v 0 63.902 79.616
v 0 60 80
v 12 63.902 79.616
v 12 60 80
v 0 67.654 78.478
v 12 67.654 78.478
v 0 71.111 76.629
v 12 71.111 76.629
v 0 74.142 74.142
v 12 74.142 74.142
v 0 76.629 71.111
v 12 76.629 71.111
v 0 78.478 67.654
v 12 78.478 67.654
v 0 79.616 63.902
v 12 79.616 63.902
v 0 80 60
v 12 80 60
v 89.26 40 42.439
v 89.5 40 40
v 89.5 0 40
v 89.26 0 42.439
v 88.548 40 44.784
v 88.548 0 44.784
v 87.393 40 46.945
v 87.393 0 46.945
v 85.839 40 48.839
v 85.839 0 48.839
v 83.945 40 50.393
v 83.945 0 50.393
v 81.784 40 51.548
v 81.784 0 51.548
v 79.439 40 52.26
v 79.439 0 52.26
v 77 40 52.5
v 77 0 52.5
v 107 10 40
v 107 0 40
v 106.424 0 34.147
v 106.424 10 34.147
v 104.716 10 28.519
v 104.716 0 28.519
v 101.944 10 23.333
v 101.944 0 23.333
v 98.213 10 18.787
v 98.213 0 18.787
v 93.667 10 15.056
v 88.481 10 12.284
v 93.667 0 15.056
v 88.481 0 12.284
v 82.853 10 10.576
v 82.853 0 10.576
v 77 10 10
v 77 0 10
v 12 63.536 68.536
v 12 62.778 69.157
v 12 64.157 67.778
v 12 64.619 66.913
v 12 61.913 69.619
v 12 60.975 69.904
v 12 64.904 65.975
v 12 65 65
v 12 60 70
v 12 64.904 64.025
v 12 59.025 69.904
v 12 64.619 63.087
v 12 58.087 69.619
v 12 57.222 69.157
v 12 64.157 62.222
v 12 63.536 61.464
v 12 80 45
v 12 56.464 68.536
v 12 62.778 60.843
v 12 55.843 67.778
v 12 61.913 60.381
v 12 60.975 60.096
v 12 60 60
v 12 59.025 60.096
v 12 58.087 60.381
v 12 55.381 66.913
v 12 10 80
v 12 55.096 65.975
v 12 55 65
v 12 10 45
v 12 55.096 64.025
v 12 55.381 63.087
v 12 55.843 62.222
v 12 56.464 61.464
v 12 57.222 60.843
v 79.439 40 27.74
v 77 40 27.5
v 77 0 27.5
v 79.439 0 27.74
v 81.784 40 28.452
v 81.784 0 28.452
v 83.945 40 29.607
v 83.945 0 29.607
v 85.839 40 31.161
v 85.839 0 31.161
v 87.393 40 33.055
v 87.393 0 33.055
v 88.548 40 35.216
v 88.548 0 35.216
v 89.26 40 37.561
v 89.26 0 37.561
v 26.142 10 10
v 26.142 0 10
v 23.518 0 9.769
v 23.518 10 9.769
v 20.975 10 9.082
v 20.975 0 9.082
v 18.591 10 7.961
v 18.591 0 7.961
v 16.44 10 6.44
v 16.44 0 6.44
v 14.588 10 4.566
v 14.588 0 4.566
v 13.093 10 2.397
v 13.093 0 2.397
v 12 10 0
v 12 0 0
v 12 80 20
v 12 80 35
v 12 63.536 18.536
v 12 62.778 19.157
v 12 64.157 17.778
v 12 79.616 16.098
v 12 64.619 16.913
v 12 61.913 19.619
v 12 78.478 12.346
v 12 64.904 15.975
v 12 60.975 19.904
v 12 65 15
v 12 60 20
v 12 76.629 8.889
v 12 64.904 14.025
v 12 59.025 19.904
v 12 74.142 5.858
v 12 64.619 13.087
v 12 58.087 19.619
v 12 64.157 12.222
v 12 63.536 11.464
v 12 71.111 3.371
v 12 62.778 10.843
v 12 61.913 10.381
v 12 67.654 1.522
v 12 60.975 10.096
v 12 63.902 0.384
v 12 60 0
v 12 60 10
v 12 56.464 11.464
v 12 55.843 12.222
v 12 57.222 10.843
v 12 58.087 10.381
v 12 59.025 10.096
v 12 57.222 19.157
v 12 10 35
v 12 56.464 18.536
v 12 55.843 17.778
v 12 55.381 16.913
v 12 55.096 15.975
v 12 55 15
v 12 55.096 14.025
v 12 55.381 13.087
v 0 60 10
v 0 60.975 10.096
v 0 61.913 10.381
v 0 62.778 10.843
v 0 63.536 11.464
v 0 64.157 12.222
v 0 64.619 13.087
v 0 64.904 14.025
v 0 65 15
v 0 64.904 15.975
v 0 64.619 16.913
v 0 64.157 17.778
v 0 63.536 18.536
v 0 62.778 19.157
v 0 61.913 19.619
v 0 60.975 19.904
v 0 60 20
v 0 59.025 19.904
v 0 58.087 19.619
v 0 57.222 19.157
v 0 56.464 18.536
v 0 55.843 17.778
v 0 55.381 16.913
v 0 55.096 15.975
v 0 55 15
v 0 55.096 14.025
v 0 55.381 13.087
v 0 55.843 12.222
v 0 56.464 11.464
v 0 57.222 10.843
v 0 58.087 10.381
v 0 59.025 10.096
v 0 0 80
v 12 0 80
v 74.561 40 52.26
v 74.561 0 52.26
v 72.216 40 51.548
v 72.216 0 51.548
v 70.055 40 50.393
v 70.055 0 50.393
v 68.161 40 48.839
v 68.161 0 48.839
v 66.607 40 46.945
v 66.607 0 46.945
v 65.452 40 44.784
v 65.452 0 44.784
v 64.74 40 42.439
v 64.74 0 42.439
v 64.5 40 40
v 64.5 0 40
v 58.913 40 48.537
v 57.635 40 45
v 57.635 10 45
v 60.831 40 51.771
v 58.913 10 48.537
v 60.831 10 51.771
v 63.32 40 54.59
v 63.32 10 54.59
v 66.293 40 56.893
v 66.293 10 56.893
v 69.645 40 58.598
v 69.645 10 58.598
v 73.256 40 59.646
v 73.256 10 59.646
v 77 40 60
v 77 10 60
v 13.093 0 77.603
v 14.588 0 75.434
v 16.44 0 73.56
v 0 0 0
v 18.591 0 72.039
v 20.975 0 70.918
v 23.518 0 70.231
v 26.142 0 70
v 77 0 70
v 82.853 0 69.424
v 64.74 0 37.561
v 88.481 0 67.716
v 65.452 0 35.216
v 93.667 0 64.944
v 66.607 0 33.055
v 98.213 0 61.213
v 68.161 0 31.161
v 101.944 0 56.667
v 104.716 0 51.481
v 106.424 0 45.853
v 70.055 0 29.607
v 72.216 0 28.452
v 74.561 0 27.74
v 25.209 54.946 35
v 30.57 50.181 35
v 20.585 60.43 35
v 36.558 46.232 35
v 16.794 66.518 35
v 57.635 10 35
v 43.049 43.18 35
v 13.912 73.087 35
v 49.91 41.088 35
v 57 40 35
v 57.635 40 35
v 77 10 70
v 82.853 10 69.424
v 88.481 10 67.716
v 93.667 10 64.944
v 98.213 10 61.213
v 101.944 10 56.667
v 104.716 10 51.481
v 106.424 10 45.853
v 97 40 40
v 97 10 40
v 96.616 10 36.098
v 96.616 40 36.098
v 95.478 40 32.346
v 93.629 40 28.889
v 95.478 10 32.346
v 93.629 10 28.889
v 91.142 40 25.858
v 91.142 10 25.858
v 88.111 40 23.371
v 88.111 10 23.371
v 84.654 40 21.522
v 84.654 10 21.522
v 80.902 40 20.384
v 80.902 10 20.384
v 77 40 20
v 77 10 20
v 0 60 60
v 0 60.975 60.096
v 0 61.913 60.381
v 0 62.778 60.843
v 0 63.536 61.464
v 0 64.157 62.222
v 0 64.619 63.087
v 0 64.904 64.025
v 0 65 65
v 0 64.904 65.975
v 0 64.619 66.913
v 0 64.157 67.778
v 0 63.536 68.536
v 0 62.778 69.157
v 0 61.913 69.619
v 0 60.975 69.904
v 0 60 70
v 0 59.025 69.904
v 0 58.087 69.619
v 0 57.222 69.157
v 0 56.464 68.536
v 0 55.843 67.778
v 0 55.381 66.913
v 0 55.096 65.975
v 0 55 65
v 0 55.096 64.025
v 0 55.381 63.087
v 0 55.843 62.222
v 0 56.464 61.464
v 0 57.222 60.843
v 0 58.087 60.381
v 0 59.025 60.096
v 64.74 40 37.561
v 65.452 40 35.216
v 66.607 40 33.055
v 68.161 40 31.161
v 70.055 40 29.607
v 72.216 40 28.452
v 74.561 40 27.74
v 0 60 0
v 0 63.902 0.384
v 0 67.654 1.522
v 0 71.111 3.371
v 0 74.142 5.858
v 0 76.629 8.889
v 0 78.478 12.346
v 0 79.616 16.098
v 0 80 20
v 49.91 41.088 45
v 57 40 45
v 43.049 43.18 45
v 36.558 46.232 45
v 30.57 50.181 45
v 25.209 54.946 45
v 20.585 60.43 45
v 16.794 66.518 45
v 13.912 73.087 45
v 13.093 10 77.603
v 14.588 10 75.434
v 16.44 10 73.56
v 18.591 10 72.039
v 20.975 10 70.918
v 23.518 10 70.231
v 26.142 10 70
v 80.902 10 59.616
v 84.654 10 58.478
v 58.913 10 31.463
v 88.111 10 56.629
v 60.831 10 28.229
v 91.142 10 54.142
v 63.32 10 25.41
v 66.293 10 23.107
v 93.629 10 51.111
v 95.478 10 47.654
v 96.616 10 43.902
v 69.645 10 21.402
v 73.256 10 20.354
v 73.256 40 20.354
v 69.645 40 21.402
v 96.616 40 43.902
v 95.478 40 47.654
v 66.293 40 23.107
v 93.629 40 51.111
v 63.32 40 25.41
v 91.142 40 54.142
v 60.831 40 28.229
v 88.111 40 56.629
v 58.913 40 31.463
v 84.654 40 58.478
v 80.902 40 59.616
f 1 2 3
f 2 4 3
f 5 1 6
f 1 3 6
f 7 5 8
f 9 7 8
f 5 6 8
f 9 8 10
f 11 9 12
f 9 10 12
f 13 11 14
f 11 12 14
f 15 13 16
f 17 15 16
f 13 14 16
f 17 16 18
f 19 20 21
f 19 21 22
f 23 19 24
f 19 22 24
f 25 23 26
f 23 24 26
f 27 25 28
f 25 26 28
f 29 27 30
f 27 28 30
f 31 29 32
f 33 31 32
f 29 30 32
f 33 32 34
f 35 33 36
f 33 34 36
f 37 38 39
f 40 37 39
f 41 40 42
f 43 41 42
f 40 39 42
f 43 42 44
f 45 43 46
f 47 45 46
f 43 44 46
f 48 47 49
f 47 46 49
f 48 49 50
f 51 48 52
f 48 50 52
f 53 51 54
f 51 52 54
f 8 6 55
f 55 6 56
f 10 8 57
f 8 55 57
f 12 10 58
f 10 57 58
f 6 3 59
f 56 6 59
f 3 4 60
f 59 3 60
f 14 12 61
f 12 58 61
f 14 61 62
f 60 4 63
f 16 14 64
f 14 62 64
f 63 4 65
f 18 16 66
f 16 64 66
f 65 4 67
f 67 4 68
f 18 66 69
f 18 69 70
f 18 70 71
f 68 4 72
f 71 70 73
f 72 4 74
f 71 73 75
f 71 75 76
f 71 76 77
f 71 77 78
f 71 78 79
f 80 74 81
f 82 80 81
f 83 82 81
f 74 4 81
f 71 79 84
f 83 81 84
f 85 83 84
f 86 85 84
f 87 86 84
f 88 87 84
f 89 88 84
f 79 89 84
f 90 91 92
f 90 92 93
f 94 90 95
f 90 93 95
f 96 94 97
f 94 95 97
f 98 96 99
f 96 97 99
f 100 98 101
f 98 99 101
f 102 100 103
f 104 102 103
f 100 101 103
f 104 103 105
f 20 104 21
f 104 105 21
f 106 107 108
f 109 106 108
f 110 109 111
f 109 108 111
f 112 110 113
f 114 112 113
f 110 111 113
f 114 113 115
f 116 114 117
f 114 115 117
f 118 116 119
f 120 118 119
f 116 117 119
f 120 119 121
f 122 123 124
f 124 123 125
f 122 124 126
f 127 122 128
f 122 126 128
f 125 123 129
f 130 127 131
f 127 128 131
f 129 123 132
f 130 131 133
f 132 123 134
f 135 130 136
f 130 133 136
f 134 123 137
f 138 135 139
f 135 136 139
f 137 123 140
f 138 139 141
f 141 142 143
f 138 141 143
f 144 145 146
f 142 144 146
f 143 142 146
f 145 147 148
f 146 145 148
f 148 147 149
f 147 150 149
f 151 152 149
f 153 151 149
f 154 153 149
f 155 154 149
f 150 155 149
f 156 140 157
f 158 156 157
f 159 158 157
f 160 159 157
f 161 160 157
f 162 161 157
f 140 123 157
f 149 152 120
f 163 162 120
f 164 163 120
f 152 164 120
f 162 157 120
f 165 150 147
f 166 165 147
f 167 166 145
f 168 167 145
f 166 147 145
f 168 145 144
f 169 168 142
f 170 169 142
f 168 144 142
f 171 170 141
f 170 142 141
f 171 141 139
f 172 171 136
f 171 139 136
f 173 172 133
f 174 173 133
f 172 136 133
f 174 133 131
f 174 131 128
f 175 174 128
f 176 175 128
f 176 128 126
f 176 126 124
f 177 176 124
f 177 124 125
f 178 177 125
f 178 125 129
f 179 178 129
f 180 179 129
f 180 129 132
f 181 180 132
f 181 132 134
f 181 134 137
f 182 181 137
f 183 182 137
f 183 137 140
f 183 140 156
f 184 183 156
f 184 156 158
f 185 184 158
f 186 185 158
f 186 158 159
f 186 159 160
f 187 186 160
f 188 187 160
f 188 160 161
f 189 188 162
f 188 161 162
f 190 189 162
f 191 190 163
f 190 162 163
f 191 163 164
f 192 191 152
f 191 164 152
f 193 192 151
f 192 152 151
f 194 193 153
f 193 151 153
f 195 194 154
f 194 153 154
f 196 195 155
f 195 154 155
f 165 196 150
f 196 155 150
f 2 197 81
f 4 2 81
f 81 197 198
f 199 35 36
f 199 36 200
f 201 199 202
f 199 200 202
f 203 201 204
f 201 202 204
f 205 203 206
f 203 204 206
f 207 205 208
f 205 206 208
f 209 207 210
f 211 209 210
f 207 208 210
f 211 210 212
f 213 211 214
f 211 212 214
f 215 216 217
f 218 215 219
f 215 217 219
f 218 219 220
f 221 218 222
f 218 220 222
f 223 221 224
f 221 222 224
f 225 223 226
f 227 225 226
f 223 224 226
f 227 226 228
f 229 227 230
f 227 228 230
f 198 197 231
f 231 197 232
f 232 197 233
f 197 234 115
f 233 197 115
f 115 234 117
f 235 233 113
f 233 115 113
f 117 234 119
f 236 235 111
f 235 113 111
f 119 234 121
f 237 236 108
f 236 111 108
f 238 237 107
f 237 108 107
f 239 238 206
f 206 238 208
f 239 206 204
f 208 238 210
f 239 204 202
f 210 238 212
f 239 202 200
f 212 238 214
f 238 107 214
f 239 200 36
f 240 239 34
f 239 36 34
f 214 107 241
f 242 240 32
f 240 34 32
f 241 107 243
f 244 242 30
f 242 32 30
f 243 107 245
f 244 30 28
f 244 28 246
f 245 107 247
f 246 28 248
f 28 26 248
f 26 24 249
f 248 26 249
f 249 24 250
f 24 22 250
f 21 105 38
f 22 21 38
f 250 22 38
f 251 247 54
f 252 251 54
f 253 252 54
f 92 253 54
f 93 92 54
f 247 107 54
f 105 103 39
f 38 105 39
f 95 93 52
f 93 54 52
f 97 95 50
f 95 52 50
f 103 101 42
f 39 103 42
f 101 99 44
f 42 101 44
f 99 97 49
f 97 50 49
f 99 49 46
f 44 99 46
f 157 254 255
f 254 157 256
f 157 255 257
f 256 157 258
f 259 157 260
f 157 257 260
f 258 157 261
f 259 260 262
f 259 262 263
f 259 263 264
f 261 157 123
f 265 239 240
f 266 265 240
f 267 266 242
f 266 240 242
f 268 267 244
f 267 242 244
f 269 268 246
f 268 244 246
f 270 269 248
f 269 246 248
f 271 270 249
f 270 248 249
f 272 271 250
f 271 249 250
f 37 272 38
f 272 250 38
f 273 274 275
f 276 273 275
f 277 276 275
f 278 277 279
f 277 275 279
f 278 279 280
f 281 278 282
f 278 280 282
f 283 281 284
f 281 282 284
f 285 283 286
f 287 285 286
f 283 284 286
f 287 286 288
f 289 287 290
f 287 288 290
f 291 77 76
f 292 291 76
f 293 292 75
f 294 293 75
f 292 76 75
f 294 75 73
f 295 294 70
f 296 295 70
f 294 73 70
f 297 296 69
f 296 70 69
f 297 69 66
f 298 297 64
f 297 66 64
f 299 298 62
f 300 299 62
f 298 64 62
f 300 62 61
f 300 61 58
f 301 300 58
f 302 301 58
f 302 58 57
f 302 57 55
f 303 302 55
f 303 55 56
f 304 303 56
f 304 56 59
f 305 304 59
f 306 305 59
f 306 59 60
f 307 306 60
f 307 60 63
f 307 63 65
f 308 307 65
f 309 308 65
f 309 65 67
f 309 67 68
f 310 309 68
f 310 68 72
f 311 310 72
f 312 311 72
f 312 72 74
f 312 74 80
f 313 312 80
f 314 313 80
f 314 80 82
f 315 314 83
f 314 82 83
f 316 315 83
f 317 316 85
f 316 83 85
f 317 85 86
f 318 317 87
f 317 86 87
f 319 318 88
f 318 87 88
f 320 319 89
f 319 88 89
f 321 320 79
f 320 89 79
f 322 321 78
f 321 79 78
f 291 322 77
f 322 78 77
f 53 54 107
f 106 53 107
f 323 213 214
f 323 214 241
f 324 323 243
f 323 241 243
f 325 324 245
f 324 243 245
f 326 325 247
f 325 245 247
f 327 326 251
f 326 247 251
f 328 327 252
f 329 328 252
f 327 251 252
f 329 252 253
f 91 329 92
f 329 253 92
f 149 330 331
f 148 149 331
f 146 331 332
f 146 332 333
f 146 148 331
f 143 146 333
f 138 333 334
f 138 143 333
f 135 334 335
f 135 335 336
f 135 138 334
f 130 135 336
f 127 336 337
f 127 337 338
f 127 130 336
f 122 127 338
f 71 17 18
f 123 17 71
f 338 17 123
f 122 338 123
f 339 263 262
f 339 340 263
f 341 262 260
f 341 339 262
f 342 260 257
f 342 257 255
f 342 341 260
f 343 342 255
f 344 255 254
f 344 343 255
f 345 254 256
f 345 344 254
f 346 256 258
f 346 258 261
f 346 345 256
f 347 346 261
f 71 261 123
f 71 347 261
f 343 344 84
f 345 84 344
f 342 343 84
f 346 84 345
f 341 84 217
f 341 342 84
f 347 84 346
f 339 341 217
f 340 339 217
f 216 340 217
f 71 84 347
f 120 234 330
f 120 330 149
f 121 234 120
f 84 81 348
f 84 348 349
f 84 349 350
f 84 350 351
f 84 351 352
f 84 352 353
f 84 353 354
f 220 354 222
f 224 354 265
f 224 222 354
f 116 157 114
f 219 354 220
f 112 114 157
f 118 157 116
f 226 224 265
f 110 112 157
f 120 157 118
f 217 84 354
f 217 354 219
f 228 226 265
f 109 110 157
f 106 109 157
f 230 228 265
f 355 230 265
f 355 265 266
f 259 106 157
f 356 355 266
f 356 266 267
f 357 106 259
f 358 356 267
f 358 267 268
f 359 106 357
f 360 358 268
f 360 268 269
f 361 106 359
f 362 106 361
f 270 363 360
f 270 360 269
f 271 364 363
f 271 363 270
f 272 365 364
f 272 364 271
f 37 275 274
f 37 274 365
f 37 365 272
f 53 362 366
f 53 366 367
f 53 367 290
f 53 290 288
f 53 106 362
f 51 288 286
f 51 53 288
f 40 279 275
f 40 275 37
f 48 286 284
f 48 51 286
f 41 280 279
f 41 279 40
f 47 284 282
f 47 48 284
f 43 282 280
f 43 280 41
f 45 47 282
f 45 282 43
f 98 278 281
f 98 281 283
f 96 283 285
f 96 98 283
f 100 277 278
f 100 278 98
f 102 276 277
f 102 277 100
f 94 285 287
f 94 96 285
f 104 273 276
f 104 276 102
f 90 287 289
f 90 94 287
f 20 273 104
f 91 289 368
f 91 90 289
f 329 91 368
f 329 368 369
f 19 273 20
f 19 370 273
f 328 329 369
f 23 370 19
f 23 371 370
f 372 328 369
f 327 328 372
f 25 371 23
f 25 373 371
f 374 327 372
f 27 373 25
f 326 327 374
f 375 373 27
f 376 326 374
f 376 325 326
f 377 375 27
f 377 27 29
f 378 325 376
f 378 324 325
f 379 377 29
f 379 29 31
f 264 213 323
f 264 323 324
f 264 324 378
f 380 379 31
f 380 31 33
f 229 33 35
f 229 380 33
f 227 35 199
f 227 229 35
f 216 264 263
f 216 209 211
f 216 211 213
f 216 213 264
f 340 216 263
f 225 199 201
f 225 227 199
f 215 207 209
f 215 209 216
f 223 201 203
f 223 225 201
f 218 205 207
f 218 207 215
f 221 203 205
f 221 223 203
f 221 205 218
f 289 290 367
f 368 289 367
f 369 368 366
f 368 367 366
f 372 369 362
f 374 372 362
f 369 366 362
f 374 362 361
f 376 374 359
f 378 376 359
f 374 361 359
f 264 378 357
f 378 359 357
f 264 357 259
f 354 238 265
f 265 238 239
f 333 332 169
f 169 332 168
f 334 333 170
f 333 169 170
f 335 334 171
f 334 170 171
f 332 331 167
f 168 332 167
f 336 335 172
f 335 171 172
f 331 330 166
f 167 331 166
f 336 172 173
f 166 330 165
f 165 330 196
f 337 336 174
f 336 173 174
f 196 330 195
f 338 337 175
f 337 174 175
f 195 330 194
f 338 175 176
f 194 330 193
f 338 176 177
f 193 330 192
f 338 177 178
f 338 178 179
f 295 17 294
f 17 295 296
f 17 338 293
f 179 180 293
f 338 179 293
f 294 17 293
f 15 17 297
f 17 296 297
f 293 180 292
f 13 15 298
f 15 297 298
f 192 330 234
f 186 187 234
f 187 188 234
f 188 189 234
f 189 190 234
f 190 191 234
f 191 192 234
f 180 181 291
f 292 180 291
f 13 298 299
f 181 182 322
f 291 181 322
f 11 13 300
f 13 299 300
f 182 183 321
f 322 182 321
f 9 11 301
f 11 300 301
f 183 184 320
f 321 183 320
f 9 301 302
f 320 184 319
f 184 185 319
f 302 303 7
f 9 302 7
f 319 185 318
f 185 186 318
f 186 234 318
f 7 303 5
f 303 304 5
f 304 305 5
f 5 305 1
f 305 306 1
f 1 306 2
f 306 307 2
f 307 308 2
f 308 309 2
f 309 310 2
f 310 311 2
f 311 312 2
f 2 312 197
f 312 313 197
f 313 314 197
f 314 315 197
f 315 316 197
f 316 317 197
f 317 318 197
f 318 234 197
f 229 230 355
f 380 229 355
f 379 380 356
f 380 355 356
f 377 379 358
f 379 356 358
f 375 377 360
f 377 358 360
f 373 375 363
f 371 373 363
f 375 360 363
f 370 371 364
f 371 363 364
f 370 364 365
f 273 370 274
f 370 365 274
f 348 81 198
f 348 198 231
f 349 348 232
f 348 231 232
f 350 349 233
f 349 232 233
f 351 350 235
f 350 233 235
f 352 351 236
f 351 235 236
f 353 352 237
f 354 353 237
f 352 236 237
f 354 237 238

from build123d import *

# Parameters (mm, degrees)
SKETCH1_R            = 20
BOSS_EXTRUDE3_DEPTH  = 10
SKETCH1_6_W          = 12
SKETCH1_6_H          = 80
BOSS_EXTRUDE4_DEPTH  = 80
FILLET1_R            = 20
SKETCH1_8_R          = 20
SKETCH1_8_R_2        = 12.5
BOSS_EXTRUDE5_DEPTH  = 40
BOSS_EXTRUDE11_DEPTH = 5
SKETCH12_R           = 5
CUT_EXTRUDE1_DEPTH   = 148.732867027


with BuildPart() as part:
    # Sketch1 → Boss-Extrude3 (new body)
    with BuildSketch(Plane(origin=(0, 0, 0), x_dir=(1, 0, 0), z_dir=(0, 1, 0))):
        with BuildLine():
            ThreePointArc((26.142135624, -10), (17.481881586, -7.247448714), (12, 0))
            Line((12, 0), (12, -80))
            ThreePointArc((12, -80), (17.481881586, -72.752551286), (26.142135624, -70))
            Line((26.142135624, -70), (77, -70))
            ThreePointArc((77, -70), (107, -40), (77, -10))
            Line((77, -10), (26.142135624, -10))
        make_face()
        with Locations((77, -40)):
            Circle(SKETCH1_R, mode=Mode.SUBTRACT)
    extrude(amount=BOSS_EXTRUDE3_DEPTH)

    # Sketch1<6> → Boss-Extrude4 (add)
    with BuildSketch(Plane(origin=(0, 0, 0), x_dir=(1, 0, 0), z_dir=(0, 1, 0))):
        with Locations((6, -40)):
            Rectangle(SKETCH1_6_W, SKETCH1_6_H)
    extrude(amount=BOSS_EXTRUDE4_DEPTH)

    # Fillet1
    fillet1_edges = [part.edges().sort_by_distance(p)[0] for p in [
        (6, 80, 0),
        (6, 80, 80),
    ]]
    fillet(fillet1_edges, radius=FILLET1_R)

    # Sketch1<8> → Boss-Extrude5 (add)
    with BuildSketch(Plane(origin=(0, 0, 0), x_dir=(1, 0, 0), z_dir=(0, 1, 0))):
        with Locations((77, -40)):
            Circle(SKETCH1_8_R)
        with Locations((77, -40)):
            Circle(SKETCH1_8_R_2, mode=Mode.SUBTRACT)
    extrude(amount=BOSS_EXTRUDE5_DEPTH)

    # Sketch11 → Boss-Extrude11 (add, symmetric)
    with BuildSketch(Plane.XY.offset(40)):
        with BuildLine():
            Line((12, 80), (12, 10))
            Line((12, 10), (57, 10))
            Line((57, 10), (64.5, 10))
            Line((64.5, 10), (64.5, 40))
            Line((64.5, 40), (57, 40))
            ThreePointArc((57, 40), (27.804407401, 52.467458326), (12, 80))
        make_face()
    extrude(amount=BOSS_EXTRUDE11_DEPTH, both=True)

    # Sketch12 → Cut-Extrude1 (cut, through all)
    with BuildSketch(Plane(origin=(12, 0, 0), x_dir=(0, 0, -1), z_dir=(1, 0, 0))):
        with Locations((-65, 60)):
            Circle(SKETCH12_R)
        with Locations((-15, 60)):
            Circle(SKETCH12_R)
    extrude(amount=-CUT_EXTRUDE1_DEPTH, mode=Mode.SUBTRACT)


solid = part.part
